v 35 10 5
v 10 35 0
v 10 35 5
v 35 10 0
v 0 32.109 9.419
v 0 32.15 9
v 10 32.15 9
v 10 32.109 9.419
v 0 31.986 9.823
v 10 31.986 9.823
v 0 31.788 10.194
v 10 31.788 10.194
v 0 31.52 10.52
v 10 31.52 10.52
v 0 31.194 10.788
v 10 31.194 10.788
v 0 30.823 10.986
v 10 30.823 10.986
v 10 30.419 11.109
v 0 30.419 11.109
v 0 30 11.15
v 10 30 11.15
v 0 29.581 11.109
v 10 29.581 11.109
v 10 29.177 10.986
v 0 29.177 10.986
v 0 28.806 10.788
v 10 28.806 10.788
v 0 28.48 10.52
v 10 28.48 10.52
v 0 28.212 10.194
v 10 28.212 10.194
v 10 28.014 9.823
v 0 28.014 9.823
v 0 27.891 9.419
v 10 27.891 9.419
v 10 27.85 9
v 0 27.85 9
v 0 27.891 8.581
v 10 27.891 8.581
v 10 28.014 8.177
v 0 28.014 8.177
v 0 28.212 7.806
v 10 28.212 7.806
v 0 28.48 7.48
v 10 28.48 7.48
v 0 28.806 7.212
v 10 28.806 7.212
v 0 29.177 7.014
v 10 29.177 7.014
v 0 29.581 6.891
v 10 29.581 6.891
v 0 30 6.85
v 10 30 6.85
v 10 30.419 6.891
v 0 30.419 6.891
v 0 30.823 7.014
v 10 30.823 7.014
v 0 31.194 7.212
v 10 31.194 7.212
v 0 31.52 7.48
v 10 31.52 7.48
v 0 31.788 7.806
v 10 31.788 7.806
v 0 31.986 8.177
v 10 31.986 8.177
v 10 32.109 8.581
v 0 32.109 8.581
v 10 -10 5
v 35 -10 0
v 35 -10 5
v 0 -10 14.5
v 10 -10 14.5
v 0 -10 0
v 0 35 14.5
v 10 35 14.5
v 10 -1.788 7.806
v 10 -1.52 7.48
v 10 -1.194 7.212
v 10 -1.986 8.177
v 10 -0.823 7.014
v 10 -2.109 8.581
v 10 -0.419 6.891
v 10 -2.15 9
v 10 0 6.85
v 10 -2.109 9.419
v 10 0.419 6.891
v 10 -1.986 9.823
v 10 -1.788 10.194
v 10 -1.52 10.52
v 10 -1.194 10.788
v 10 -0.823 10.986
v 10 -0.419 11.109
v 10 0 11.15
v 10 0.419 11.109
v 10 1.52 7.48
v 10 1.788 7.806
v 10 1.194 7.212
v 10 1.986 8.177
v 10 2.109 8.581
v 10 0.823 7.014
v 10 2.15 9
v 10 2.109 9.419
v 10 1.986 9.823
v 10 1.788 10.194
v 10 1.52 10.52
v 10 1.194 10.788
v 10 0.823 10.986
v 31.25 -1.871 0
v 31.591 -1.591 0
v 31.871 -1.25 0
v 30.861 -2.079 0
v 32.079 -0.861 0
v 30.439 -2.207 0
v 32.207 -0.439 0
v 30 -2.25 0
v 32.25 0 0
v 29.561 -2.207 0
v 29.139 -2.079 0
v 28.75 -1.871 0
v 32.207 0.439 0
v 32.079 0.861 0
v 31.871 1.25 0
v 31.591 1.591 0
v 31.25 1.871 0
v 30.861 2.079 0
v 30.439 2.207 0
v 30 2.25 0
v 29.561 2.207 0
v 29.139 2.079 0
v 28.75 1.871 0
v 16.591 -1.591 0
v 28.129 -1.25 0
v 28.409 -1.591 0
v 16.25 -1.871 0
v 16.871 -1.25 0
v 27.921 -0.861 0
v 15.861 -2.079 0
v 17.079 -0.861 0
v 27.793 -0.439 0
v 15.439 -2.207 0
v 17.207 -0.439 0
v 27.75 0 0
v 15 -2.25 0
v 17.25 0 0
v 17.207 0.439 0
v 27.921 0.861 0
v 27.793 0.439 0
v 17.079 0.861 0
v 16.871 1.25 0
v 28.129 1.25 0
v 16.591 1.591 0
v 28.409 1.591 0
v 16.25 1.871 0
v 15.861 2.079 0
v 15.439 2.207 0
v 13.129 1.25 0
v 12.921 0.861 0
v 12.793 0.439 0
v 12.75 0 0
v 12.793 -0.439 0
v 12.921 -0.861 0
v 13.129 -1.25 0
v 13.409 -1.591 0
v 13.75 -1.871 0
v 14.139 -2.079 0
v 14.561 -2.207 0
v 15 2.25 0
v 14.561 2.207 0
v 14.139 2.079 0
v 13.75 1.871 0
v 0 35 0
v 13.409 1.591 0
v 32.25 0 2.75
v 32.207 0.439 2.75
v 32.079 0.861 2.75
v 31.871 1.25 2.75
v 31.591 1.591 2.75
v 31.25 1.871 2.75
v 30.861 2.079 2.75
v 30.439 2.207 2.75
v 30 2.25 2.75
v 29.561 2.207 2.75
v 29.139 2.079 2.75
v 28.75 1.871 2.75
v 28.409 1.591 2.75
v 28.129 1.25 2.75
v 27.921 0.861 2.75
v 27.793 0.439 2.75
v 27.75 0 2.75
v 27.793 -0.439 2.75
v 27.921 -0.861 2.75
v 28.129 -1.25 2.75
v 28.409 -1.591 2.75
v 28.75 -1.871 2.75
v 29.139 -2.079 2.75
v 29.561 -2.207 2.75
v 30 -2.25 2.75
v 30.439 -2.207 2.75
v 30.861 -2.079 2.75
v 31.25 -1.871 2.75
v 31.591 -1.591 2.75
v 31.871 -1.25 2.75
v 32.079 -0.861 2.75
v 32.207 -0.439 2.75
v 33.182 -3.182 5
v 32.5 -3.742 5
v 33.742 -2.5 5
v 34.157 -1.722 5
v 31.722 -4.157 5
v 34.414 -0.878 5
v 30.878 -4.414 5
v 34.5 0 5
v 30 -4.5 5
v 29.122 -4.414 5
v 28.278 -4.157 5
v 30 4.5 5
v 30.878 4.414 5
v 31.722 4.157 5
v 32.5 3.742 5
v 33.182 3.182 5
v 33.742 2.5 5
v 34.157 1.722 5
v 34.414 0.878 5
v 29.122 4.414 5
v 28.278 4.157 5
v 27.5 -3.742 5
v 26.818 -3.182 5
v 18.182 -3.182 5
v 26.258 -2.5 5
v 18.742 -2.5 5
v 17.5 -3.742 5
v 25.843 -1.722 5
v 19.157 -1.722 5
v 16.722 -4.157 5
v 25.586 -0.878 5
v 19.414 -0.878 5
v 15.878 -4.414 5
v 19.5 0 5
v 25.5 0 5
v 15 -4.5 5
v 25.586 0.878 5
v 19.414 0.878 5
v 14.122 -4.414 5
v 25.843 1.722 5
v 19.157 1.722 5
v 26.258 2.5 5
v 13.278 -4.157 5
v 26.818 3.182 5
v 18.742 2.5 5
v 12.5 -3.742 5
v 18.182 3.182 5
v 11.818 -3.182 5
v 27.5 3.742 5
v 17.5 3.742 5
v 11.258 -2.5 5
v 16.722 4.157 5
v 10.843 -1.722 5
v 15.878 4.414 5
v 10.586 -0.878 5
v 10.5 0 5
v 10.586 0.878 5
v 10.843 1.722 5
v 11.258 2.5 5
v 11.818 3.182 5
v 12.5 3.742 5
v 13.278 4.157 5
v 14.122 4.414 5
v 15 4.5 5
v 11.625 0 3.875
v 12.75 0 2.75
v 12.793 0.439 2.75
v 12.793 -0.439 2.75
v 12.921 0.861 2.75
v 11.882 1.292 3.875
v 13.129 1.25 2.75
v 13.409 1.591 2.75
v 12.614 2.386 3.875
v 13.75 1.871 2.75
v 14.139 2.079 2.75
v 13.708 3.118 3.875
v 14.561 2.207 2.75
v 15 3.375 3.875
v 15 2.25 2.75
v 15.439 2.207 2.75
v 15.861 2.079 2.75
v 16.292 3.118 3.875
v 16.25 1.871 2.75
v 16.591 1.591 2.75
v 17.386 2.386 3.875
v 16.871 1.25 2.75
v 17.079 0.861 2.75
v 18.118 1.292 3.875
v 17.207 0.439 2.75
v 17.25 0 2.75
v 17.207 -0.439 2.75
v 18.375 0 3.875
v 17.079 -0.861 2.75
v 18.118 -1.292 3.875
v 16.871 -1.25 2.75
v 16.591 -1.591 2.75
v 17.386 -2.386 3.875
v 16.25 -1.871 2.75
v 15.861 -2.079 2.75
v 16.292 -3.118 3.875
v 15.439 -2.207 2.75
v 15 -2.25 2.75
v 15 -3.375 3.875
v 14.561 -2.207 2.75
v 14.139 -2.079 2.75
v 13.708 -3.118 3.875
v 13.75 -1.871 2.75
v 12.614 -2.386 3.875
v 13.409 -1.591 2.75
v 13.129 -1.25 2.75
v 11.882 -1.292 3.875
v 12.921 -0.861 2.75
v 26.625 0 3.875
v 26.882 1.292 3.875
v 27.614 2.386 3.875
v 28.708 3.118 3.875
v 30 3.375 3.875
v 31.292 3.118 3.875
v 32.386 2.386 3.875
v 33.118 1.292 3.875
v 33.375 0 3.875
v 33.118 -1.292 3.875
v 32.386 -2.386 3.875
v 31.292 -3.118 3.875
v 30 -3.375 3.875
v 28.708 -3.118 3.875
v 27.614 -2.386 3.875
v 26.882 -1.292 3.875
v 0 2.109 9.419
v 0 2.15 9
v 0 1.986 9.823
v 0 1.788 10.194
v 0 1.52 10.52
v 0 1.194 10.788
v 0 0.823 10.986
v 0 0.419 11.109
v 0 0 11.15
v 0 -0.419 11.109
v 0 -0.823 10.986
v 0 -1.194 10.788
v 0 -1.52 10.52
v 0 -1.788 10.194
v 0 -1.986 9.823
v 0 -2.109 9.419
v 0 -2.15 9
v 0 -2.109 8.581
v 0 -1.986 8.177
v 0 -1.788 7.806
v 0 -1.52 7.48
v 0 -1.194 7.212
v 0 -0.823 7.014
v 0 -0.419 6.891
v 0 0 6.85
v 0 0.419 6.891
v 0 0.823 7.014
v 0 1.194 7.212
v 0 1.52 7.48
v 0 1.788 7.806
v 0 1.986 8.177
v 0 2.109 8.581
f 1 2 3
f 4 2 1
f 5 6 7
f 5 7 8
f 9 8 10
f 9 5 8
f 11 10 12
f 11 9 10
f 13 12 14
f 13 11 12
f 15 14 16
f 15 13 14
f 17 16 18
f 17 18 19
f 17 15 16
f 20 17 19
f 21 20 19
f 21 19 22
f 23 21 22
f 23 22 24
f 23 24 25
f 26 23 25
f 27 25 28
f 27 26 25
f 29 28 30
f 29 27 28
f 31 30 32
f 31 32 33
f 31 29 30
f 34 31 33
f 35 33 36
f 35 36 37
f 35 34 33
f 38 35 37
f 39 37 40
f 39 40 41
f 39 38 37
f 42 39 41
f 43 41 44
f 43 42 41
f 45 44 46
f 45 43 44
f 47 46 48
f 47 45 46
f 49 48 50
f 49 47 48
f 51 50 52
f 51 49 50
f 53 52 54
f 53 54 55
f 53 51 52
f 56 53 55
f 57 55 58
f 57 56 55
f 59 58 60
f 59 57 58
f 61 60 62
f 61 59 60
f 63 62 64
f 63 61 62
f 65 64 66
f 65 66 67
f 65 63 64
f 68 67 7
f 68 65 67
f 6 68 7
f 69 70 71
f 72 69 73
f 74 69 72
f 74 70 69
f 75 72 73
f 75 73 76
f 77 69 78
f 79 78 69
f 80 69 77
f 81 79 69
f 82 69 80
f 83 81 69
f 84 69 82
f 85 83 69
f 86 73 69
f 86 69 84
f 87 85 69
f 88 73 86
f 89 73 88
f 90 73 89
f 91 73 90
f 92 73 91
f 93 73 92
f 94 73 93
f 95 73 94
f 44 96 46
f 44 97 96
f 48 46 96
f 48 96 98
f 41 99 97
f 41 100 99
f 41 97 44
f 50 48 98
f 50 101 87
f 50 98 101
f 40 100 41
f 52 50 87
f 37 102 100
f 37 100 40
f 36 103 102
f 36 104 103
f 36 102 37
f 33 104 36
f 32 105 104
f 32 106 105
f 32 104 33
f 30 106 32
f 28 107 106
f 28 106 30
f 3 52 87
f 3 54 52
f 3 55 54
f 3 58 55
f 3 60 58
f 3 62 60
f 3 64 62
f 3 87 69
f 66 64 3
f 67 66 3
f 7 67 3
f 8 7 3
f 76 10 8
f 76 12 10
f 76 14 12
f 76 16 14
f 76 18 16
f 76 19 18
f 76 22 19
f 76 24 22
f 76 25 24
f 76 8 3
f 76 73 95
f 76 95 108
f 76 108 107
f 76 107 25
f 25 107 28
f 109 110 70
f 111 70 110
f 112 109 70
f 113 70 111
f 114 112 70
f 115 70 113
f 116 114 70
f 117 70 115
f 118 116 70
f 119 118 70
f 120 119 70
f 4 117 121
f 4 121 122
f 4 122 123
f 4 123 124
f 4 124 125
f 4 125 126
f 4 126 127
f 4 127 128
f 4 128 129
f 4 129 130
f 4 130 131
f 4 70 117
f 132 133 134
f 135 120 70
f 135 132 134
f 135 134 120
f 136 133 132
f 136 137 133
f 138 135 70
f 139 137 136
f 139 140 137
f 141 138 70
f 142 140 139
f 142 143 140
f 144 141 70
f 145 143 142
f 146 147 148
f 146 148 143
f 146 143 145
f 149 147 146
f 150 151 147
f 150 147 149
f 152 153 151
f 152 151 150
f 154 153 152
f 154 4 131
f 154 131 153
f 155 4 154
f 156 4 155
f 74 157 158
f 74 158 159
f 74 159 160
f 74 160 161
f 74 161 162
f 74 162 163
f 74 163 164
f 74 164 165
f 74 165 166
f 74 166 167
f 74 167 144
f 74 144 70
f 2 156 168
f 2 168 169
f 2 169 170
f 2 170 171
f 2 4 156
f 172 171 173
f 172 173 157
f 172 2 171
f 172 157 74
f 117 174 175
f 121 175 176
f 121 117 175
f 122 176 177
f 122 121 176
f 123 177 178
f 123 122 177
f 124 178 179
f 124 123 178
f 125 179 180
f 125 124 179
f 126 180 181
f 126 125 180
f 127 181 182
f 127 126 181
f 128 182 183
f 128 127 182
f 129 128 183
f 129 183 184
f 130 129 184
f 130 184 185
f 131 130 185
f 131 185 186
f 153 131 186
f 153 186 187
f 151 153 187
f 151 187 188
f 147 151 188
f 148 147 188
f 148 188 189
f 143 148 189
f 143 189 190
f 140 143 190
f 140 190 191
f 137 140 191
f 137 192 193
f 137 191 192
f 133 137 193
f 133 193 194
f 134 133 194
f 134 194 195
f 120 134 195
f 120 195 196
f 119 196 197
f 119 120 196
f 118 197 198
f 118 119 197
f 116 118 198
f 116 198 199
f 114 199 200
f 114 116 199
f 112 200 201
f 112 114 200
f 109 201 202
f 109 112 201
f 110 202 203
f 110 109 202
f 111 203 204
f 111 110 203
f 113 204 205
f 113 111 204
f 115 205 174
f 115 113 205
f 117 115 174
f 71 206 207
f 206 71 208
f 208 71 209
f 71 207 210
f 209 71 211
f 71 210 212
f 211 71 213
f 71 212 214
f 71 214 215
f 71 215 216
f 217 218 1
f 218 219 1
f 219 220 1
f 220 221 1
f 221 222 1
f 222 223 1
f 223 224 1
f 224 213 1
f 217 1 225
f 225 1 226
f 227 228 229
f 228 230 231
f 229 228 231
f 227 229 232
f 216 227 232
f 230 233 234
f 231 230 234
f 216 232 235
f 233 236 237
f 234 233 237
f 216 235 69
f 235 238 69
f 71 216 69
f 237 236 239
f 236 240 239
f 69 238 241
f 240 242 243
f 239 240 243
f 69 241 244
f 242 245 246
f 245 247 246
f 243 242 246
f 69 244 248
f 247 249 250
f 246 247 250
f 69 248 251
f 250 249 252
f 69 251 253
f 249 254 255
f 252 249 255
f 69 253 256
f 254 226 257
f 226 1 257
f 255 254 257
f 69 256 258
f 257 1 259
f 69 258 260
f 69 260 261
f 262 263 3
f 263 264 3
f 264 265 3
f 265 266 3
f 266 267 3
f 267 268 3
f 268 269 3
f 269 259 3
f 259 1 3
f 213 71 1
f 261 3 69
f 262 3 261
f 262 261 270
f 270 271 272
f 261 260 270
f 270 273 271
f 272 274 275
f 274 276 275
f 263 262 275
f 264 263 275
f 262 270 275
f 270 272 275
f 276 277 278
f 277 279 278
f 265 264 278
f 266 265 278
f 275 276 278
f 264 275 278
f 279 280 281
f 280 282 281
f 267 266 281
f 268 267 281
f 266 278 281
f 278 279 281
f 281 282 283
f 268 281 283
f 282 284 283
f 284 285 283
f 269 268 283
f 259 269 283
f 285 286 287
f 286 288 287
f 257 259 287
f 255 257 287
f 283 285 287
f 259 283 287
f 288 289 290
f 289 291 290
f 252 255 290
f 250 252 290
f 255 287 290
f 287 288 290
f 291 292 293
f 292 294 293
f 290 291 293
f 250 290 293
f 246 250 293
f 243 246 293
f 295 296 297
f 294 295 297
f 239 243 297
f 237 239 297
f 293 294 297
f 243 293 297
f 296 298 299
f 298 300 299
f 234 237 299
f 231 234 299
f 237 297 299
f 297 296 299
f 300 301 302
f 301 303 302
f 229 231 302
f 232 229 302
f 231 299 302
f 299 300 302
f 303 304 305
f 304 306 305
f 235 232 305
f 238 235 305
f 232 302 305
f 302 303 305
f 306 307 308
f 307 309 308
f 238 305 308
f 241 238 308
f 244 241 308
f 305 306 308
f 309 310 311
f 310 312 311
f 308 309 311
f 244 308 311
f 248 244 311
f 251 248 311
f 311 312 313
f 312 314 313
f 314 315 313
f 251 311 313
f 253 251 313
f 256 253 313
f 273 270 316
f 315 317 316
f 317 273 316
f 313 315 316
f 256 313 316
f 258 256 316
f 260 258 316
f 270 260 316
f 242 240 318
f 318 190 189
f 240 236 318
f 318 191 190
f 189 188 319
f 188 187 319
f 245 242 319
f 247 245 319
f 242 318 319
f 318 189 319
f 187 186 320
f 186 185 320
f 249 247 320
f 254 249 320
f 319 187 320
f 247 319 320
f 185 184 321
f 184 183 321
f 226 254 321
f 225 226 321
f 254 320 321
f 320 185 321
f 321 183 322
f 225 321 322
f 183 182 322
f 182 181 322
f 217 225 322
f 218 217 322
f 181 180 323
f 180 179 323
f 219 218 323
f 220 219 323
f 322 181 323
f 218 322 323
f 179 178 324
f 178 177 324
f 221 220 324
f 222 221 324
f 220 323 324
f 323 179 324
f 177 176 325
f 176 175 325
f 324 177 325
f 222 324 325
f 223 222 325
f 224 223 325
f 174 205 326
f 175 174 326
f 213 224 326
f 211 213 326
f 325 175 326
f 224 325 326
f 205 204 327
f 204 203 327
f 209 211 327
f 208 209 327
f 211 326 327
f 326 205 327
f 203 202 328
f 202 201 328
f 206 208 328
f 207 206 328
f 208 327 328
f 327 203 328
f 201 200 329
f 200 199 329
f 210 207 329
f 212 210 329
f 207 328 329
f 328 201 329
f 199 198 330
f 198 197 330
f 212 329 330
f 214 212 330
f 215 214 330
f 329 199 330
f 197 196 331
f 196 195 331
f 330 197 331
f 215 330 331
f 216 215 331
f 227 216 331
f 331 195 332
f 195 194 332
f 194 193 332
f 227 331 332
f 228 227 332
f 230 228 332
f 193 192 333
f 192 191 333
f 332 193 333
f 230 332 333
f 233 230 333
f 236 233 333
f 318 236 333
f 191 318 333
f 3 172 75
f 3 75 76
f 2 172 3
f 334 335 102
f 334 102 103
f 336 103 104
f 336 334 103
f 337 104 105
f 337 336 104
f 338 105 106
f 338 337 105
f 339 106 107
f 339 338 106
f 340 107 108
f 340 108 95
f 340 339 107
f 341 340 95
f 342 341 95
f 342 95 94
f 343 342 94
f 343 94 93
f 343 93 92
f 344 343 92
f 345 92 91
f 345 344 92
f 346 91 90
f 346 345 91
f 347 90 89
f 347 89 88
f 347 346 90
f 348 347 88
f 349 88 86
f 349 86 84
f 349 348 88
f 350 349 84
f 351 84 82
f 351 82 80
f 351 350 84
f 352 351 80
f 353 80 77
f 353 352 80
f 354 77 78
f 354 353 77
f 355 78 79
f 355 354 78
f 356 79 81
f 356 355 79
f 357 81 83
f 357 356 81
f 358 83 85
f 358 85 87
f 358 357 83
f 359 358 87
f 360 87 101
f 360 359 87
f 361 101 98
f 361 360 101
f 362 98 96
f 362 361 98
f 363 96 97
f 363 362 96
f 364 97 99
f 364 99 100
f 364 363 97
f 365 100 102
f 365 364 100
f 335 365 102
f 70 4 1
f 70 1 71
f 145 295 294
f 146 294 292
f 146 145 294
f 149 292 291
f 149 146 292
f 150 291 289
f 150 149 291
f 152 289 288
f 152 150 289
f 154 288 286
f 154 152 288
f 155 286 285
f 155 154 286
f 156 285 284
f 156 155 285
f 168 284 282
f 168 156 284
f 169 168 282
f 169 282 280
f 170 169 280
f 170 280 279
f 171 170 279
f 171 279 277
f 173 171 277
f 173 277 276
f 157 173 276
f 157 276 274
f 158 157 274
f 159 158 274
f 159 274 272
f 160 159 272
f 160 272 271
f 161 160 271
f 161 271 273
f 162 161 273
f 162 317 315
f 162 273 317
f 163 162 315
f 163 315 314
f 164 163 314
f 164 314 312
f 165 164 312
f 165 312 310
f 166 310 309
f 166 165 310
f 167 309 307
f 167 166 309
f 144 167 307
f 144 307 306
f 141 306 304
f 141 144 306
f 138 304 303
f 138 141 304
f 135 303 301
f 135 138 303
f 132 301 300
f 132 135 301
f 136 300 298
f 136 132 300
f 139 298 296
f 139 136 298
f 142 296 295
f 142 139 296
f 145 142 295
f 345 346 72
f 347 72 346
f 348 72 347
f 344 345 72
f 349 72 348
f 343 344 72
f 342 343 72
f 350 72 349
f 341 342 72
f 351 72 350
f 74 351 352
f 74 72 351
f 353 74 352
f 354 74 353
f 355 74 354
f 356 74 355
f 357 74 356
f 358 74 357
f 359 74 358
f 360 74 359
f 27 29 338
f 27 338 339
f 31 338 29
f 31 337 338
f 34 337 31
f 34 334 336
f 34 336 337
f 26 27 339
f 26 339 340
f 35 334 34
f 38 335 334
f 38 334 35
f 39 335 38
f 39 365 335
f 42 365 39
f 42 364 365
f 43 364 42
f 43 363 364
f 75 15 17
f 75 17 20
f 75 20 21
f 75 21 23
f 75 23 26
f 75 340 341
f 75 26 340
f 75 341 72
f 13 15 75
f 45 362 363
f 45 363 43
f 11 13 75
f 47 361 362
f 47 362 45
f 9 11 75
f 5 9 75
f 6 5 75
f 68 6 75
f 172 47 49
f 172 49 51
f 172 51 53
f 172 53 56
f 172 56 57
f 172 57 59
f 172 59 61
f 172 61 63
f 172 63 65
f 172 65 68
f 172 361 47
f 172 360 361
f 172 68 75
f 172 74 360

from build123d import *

# Parameters (mm, degrees)
SKETCH033_R         = 2.25
PAD019_DEPTH        = 5
SKETCH035_W         = 45
SKETCH035_H         = 14.5
SKETCH035_R         = 2.15
PAD020_DEPTH        = 10
HOLE007_D           = 4.5
HOLE007_CSINK_D     = 9
HOLE007_CSINK_ANGLE = 90


with BuildPart() as part:
    # Sketch033 → Pad019 (new body)
    with BuildSketch(Plane.XY):
        Polygon((35, 10), (35, -10), (0, -10), (0, 35), (10, 35), align=None)
        with Locations((15, 0)):
            Circle(SKETCH033_R, mode=Mode.SUBTRACT)
        with Locations((30, 0)):
            Circle(SKETCH033_R, mode=Mode.SUBTRACT)
    extrude(amount=PAD019_DEPTH)

    # Sketch035 → Pad020 (join)
    with BuildSketch(Plane.YZ):
        with Locations((12.5, 7.25)):
            Rectangle(SKETCH035_W, SKETCH035_H)
        with Locations((0, 9)):
            Circle(SKETCH035_R, mode=Mode.SUBTRACT)
        with Locations((30, 9)):
            Circle(SKETCH035_R, mode=Mode.SUBTRACT)
    extrude(amount=PAD020_DEPTH)

    # Hole007 (through all)
    with Locations(Plane.XY.offset(5)):
        with Locations((15, 0), (30, 0)):
            CounterSinkHole(HOLE007_D / 2, HOLE007_CSINK_D / 2, counter_sink_angle=HOLE007_CSINK_ANGLE)


solid = part.part
